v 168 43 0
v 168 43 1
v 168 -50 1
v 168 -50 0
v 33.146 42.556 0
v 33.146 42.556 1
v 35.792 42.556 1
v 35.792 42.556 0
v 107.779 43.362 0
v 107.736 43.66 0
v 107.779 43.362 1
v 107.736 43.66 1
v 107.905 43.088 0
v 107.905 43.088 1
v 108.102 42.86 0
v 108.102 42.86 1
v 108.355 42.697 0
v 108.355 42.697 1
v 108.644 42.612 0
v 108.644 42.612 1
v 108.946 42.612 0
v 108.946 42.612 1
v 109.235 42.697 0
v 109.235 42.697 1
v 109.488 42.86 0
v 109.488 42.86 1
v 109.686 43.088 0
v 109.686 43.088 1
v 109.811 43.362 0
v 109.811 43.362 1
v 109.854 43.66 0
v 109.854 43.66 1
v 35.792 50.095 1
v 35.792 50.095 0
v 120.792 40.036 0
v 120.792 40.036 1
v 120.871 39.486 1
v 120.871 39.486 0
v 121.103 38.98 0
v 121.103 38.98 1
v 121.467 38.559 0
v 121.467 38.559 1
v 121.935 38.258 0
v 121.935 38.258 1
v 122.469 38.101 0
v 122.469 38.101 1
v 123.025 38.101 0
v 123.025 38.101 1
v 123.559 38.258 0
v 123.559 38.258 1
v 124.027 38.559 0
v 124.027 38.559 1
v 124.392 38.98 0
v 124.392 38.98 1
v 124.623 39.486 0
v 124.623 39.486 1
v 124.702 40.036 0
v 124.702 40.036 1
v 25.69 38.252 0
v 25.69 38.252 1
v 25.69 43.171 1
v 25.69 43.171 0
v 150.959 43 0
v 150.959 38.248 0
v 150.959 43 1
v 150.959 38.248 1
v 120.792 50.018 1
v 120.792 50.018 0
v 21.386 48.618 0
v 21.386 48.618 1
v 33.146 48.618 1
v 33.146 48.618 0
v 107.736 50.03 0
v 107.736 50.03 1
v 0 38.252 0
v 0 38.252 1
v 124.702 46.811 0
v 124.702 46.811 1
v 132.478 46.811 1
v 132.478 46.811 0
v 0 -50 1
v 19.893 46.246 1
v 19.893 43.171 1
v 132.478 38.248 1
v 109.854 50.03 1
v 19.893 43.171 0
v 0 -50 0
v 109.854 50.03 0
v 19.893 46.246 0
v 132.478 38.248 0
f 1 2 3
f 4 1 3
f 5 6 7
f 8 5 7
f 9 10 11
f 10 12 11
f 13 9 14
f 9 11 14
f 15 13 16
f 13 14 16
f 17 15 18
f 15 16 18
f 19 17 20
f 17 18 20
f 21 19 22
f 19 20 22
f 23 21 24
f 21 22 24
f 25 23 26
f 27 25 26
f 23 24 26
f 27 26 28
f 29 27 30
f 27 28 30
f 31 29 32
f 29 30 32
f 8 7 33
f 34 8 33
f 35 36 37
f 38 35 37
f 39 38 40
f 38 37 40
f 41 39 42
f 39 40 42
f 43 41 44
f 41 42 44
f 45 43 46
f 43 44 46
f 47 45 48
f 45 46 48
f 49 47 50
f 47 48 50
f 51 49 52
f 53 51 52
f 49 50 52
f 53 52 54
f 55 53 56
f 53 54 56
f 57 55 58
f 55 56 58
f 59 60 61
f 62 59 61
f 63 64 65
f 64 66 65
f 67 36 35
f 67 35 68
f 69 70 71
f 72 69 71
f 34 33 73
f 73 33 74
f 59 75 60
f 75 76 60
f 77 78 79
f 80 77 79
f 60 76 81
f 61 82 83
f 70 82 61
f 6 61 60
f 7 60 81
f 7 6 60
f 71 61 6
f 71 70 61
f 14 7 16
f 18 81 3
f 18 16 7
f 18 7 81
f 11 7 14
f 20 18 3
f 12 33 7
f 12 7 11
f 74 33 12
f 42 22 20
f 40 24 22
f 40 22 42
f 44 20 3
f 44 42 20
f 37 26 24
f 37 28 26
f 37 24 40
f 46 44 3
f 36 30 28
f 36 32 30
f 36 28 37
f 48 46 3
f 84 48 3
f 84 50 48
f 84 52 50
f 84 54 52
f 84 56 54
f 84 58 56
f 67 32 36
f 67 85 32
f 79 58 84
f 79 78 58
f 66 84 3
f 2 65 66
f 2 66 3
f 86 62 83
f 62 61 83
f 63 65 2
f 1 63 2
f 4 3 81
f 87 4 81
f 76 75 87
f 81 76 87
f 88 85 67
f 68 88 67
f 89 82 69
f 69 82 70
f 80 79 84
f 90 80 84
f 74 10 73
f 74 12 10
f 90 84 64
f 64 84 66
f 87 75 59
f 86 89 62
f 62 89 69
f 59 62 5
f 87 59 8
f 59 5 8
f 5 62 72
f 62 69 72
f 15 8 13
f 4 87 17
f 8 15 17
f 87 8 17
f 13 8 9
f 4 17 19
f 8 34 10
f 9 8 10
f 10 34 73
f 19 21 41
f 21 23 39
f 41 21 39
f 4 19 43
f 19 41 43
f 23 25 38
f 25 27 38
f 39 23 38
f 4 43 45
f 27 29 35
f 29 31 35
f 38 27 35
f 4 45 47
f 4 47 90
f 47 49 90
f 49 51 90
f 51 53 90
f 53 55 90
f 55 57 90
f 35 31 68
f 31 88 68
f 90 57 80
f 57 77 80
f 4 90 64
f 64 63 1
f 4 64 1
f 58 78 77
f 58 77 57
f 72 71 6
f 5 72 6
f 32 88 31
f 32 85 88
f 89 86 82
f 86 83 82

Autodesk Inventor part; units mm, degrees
ref_plane "YZ Plane" through (0, 0, 0) normal (1, 0, 0) x (0, 1, 0)
ref_plane "XZ Plane" through (0, 0, 0) normal (0, 1, 0) x (-1, 0, 0)
ref_plane "XY Plane" through (0, 0, 0) normal (0, 0, 1) x (1, 0, 0)
sketch "Sketch1" plane through (0, 0, 0) normal (0, 0, 1) x (1, 0, 0)
  line L0 (0, 96) -> (0, -72) projected
  line L1 (-18, 0) -> (234, 0) projected
  line L2 (0, 60) -> (180, 60)
  line L3 (180, 60) -> (180, -60)
  line L4 (180, -60) -> (0, -60)
  line L5 (0, -60) -> (0, 60)
  dimension "d0" = 180
  dimension "d1" = 120
extrude "Extrusion1" add sketch "Sketch1" along normal blind 1
decal "Decal2"
decal "Decal3"
sketch "Sketch5" plane through (0, 0, 1) normal (0, 0, 1) x (1, 0, 0)
  line L0 (0, 60) -> (180, 60) projected
  line L1 (0, -60) -> (0, 60) projected
  line L2 (180, -60) -> (0, -60) projected
  line L3 (0, 38.2522) -> (25.6905, 38.2522)
  line L4 (25.6905, 38.2522) -> (25.6905, 43.1713)
  line L5 (25.6905, 43.1713) -> (19.893, 43.1713)
  line L6 (19.893, 43.1713) -> (19.893, 46.2458)
  line L7 (19.893, 46.2458) -> (21.3863, 48.6175)
  line L8 (21.3863, 48.6175) -> (33.1461, 48.6175)
  line L9 (33.1461, 48.6175) -> (33.1461, 42.5564)
  line L10 (33.1461, 42.5564) -> (35.7923, 42.5564)
  line L11 (35.7923, 42.5564) -> (35.7923, 60)
  line L12 (120.7923, 60) -> (124.7021, 60)
  line L13 (124.7021, 60) -> (124.7021, 40.0365)
  line L14 (124.7021, 40.0365) -> (120.7923, 40.0365)
  line L15 (120.7923, 40.0365) -> (120.7923, 60)
  circle A0 centre (122.7472, 40.0365) radius 1.9549
  line L16 (35.7923, 50.0951) -> (120.7923, 50.0183)
  line L17 (107.7365, 50.0301) -> (109.8537, 50.0301)
  line L18 (109.8537, 50.0301) -> (109.8537, 43.66)
  line L19 (109.8537, 43.66) -> (107.7365, 43.66)
  line L20 (107.7365, 43.66) -> (107.7365, 50.0301)
  circle A1 centre (108.7951, 43.66) radius 1.0586
  dimension "d14" = 85
extrude "Extrusion2" cut sketch "Sketch5" against normal through all
sketch "Sketch6" plane through (0, 0, 1) normal (0, 0, 1) x (1, 0, 0)
  line L0 (124.7021, 60) -> (124.7021, 40.0365) projected
  line L1 (0, -60) -> (0, 38.2522) projected
  line L2 (180, -60) -> (0, -60) projected
  line L3 (180, 60) -> (180, -60) projected
  line L4 (124.7021, 60) -> (180, 60) projected
  line L5 (124.7021, 46.8108) -> (132.4781, 46.8108)
  line L6 (132.4781, 46.8108) -> (132.4781, 38.2477)
  line L7 (168, -50) -> (0, -50)
  line L8 (-18, 0) -> (234, 0) projected
  line L9 (168, 43) -> (168, -50)
  line L10 (132.4781, 38.2477) -> (150.9588, 38.2477)
  line L11 (150.9588, 38.2477) -> (150.9588, 43)
  line L12 (150.9588, 43) -> (168, 43)
  dimension "d16" = 93
  dimension "d17" = 10
  dimension "d18" = 168
extrude "Extrusion3" cut sketch "Sketch6" against normal through all contours L4 L3 L8 L9 L12 L11 L10 L6 L5 L0 | L3 L2 L1 L7 L9 L8
sketch "Sketch3" plane through (0, 0, 1) normal (0, 0, 1) x (1, 0, 0)
  line L0 (0, 50.1511) -> (168, 50.1511) construction
  line L1 (168, 50.1511) -> (168, -50.153) construction
  line L2 (168, -50.153) -> (0, -50.153) construction
  line L3 (0, -50.153) -> (0, 50.1511) construction
  point P0 (0, 0)
  point P1 (0, 0)
sketch "Sketch4" plane through (0, 0, 0) normal (0, 0, -1) x (-1, 0, 0)
  line L0 (0, -60) -> (0, 60) projected
  line L1 (-165.5, 50.5194) -> (0, 50.5194) construction
  line L2 (0, 50.5194) -> (0, -50.5196) construction
  line L3 (0, -50.5196) -> (-165.5, -50.5196) construction
  line L4 (-165.5, -50.5196) -> (-165.5, 50.5194) construction
  point P0 (0, 0)
  point P1 (0, 0)
  point P2 (0, -50.5196)
properties part number "config - graphic card"
